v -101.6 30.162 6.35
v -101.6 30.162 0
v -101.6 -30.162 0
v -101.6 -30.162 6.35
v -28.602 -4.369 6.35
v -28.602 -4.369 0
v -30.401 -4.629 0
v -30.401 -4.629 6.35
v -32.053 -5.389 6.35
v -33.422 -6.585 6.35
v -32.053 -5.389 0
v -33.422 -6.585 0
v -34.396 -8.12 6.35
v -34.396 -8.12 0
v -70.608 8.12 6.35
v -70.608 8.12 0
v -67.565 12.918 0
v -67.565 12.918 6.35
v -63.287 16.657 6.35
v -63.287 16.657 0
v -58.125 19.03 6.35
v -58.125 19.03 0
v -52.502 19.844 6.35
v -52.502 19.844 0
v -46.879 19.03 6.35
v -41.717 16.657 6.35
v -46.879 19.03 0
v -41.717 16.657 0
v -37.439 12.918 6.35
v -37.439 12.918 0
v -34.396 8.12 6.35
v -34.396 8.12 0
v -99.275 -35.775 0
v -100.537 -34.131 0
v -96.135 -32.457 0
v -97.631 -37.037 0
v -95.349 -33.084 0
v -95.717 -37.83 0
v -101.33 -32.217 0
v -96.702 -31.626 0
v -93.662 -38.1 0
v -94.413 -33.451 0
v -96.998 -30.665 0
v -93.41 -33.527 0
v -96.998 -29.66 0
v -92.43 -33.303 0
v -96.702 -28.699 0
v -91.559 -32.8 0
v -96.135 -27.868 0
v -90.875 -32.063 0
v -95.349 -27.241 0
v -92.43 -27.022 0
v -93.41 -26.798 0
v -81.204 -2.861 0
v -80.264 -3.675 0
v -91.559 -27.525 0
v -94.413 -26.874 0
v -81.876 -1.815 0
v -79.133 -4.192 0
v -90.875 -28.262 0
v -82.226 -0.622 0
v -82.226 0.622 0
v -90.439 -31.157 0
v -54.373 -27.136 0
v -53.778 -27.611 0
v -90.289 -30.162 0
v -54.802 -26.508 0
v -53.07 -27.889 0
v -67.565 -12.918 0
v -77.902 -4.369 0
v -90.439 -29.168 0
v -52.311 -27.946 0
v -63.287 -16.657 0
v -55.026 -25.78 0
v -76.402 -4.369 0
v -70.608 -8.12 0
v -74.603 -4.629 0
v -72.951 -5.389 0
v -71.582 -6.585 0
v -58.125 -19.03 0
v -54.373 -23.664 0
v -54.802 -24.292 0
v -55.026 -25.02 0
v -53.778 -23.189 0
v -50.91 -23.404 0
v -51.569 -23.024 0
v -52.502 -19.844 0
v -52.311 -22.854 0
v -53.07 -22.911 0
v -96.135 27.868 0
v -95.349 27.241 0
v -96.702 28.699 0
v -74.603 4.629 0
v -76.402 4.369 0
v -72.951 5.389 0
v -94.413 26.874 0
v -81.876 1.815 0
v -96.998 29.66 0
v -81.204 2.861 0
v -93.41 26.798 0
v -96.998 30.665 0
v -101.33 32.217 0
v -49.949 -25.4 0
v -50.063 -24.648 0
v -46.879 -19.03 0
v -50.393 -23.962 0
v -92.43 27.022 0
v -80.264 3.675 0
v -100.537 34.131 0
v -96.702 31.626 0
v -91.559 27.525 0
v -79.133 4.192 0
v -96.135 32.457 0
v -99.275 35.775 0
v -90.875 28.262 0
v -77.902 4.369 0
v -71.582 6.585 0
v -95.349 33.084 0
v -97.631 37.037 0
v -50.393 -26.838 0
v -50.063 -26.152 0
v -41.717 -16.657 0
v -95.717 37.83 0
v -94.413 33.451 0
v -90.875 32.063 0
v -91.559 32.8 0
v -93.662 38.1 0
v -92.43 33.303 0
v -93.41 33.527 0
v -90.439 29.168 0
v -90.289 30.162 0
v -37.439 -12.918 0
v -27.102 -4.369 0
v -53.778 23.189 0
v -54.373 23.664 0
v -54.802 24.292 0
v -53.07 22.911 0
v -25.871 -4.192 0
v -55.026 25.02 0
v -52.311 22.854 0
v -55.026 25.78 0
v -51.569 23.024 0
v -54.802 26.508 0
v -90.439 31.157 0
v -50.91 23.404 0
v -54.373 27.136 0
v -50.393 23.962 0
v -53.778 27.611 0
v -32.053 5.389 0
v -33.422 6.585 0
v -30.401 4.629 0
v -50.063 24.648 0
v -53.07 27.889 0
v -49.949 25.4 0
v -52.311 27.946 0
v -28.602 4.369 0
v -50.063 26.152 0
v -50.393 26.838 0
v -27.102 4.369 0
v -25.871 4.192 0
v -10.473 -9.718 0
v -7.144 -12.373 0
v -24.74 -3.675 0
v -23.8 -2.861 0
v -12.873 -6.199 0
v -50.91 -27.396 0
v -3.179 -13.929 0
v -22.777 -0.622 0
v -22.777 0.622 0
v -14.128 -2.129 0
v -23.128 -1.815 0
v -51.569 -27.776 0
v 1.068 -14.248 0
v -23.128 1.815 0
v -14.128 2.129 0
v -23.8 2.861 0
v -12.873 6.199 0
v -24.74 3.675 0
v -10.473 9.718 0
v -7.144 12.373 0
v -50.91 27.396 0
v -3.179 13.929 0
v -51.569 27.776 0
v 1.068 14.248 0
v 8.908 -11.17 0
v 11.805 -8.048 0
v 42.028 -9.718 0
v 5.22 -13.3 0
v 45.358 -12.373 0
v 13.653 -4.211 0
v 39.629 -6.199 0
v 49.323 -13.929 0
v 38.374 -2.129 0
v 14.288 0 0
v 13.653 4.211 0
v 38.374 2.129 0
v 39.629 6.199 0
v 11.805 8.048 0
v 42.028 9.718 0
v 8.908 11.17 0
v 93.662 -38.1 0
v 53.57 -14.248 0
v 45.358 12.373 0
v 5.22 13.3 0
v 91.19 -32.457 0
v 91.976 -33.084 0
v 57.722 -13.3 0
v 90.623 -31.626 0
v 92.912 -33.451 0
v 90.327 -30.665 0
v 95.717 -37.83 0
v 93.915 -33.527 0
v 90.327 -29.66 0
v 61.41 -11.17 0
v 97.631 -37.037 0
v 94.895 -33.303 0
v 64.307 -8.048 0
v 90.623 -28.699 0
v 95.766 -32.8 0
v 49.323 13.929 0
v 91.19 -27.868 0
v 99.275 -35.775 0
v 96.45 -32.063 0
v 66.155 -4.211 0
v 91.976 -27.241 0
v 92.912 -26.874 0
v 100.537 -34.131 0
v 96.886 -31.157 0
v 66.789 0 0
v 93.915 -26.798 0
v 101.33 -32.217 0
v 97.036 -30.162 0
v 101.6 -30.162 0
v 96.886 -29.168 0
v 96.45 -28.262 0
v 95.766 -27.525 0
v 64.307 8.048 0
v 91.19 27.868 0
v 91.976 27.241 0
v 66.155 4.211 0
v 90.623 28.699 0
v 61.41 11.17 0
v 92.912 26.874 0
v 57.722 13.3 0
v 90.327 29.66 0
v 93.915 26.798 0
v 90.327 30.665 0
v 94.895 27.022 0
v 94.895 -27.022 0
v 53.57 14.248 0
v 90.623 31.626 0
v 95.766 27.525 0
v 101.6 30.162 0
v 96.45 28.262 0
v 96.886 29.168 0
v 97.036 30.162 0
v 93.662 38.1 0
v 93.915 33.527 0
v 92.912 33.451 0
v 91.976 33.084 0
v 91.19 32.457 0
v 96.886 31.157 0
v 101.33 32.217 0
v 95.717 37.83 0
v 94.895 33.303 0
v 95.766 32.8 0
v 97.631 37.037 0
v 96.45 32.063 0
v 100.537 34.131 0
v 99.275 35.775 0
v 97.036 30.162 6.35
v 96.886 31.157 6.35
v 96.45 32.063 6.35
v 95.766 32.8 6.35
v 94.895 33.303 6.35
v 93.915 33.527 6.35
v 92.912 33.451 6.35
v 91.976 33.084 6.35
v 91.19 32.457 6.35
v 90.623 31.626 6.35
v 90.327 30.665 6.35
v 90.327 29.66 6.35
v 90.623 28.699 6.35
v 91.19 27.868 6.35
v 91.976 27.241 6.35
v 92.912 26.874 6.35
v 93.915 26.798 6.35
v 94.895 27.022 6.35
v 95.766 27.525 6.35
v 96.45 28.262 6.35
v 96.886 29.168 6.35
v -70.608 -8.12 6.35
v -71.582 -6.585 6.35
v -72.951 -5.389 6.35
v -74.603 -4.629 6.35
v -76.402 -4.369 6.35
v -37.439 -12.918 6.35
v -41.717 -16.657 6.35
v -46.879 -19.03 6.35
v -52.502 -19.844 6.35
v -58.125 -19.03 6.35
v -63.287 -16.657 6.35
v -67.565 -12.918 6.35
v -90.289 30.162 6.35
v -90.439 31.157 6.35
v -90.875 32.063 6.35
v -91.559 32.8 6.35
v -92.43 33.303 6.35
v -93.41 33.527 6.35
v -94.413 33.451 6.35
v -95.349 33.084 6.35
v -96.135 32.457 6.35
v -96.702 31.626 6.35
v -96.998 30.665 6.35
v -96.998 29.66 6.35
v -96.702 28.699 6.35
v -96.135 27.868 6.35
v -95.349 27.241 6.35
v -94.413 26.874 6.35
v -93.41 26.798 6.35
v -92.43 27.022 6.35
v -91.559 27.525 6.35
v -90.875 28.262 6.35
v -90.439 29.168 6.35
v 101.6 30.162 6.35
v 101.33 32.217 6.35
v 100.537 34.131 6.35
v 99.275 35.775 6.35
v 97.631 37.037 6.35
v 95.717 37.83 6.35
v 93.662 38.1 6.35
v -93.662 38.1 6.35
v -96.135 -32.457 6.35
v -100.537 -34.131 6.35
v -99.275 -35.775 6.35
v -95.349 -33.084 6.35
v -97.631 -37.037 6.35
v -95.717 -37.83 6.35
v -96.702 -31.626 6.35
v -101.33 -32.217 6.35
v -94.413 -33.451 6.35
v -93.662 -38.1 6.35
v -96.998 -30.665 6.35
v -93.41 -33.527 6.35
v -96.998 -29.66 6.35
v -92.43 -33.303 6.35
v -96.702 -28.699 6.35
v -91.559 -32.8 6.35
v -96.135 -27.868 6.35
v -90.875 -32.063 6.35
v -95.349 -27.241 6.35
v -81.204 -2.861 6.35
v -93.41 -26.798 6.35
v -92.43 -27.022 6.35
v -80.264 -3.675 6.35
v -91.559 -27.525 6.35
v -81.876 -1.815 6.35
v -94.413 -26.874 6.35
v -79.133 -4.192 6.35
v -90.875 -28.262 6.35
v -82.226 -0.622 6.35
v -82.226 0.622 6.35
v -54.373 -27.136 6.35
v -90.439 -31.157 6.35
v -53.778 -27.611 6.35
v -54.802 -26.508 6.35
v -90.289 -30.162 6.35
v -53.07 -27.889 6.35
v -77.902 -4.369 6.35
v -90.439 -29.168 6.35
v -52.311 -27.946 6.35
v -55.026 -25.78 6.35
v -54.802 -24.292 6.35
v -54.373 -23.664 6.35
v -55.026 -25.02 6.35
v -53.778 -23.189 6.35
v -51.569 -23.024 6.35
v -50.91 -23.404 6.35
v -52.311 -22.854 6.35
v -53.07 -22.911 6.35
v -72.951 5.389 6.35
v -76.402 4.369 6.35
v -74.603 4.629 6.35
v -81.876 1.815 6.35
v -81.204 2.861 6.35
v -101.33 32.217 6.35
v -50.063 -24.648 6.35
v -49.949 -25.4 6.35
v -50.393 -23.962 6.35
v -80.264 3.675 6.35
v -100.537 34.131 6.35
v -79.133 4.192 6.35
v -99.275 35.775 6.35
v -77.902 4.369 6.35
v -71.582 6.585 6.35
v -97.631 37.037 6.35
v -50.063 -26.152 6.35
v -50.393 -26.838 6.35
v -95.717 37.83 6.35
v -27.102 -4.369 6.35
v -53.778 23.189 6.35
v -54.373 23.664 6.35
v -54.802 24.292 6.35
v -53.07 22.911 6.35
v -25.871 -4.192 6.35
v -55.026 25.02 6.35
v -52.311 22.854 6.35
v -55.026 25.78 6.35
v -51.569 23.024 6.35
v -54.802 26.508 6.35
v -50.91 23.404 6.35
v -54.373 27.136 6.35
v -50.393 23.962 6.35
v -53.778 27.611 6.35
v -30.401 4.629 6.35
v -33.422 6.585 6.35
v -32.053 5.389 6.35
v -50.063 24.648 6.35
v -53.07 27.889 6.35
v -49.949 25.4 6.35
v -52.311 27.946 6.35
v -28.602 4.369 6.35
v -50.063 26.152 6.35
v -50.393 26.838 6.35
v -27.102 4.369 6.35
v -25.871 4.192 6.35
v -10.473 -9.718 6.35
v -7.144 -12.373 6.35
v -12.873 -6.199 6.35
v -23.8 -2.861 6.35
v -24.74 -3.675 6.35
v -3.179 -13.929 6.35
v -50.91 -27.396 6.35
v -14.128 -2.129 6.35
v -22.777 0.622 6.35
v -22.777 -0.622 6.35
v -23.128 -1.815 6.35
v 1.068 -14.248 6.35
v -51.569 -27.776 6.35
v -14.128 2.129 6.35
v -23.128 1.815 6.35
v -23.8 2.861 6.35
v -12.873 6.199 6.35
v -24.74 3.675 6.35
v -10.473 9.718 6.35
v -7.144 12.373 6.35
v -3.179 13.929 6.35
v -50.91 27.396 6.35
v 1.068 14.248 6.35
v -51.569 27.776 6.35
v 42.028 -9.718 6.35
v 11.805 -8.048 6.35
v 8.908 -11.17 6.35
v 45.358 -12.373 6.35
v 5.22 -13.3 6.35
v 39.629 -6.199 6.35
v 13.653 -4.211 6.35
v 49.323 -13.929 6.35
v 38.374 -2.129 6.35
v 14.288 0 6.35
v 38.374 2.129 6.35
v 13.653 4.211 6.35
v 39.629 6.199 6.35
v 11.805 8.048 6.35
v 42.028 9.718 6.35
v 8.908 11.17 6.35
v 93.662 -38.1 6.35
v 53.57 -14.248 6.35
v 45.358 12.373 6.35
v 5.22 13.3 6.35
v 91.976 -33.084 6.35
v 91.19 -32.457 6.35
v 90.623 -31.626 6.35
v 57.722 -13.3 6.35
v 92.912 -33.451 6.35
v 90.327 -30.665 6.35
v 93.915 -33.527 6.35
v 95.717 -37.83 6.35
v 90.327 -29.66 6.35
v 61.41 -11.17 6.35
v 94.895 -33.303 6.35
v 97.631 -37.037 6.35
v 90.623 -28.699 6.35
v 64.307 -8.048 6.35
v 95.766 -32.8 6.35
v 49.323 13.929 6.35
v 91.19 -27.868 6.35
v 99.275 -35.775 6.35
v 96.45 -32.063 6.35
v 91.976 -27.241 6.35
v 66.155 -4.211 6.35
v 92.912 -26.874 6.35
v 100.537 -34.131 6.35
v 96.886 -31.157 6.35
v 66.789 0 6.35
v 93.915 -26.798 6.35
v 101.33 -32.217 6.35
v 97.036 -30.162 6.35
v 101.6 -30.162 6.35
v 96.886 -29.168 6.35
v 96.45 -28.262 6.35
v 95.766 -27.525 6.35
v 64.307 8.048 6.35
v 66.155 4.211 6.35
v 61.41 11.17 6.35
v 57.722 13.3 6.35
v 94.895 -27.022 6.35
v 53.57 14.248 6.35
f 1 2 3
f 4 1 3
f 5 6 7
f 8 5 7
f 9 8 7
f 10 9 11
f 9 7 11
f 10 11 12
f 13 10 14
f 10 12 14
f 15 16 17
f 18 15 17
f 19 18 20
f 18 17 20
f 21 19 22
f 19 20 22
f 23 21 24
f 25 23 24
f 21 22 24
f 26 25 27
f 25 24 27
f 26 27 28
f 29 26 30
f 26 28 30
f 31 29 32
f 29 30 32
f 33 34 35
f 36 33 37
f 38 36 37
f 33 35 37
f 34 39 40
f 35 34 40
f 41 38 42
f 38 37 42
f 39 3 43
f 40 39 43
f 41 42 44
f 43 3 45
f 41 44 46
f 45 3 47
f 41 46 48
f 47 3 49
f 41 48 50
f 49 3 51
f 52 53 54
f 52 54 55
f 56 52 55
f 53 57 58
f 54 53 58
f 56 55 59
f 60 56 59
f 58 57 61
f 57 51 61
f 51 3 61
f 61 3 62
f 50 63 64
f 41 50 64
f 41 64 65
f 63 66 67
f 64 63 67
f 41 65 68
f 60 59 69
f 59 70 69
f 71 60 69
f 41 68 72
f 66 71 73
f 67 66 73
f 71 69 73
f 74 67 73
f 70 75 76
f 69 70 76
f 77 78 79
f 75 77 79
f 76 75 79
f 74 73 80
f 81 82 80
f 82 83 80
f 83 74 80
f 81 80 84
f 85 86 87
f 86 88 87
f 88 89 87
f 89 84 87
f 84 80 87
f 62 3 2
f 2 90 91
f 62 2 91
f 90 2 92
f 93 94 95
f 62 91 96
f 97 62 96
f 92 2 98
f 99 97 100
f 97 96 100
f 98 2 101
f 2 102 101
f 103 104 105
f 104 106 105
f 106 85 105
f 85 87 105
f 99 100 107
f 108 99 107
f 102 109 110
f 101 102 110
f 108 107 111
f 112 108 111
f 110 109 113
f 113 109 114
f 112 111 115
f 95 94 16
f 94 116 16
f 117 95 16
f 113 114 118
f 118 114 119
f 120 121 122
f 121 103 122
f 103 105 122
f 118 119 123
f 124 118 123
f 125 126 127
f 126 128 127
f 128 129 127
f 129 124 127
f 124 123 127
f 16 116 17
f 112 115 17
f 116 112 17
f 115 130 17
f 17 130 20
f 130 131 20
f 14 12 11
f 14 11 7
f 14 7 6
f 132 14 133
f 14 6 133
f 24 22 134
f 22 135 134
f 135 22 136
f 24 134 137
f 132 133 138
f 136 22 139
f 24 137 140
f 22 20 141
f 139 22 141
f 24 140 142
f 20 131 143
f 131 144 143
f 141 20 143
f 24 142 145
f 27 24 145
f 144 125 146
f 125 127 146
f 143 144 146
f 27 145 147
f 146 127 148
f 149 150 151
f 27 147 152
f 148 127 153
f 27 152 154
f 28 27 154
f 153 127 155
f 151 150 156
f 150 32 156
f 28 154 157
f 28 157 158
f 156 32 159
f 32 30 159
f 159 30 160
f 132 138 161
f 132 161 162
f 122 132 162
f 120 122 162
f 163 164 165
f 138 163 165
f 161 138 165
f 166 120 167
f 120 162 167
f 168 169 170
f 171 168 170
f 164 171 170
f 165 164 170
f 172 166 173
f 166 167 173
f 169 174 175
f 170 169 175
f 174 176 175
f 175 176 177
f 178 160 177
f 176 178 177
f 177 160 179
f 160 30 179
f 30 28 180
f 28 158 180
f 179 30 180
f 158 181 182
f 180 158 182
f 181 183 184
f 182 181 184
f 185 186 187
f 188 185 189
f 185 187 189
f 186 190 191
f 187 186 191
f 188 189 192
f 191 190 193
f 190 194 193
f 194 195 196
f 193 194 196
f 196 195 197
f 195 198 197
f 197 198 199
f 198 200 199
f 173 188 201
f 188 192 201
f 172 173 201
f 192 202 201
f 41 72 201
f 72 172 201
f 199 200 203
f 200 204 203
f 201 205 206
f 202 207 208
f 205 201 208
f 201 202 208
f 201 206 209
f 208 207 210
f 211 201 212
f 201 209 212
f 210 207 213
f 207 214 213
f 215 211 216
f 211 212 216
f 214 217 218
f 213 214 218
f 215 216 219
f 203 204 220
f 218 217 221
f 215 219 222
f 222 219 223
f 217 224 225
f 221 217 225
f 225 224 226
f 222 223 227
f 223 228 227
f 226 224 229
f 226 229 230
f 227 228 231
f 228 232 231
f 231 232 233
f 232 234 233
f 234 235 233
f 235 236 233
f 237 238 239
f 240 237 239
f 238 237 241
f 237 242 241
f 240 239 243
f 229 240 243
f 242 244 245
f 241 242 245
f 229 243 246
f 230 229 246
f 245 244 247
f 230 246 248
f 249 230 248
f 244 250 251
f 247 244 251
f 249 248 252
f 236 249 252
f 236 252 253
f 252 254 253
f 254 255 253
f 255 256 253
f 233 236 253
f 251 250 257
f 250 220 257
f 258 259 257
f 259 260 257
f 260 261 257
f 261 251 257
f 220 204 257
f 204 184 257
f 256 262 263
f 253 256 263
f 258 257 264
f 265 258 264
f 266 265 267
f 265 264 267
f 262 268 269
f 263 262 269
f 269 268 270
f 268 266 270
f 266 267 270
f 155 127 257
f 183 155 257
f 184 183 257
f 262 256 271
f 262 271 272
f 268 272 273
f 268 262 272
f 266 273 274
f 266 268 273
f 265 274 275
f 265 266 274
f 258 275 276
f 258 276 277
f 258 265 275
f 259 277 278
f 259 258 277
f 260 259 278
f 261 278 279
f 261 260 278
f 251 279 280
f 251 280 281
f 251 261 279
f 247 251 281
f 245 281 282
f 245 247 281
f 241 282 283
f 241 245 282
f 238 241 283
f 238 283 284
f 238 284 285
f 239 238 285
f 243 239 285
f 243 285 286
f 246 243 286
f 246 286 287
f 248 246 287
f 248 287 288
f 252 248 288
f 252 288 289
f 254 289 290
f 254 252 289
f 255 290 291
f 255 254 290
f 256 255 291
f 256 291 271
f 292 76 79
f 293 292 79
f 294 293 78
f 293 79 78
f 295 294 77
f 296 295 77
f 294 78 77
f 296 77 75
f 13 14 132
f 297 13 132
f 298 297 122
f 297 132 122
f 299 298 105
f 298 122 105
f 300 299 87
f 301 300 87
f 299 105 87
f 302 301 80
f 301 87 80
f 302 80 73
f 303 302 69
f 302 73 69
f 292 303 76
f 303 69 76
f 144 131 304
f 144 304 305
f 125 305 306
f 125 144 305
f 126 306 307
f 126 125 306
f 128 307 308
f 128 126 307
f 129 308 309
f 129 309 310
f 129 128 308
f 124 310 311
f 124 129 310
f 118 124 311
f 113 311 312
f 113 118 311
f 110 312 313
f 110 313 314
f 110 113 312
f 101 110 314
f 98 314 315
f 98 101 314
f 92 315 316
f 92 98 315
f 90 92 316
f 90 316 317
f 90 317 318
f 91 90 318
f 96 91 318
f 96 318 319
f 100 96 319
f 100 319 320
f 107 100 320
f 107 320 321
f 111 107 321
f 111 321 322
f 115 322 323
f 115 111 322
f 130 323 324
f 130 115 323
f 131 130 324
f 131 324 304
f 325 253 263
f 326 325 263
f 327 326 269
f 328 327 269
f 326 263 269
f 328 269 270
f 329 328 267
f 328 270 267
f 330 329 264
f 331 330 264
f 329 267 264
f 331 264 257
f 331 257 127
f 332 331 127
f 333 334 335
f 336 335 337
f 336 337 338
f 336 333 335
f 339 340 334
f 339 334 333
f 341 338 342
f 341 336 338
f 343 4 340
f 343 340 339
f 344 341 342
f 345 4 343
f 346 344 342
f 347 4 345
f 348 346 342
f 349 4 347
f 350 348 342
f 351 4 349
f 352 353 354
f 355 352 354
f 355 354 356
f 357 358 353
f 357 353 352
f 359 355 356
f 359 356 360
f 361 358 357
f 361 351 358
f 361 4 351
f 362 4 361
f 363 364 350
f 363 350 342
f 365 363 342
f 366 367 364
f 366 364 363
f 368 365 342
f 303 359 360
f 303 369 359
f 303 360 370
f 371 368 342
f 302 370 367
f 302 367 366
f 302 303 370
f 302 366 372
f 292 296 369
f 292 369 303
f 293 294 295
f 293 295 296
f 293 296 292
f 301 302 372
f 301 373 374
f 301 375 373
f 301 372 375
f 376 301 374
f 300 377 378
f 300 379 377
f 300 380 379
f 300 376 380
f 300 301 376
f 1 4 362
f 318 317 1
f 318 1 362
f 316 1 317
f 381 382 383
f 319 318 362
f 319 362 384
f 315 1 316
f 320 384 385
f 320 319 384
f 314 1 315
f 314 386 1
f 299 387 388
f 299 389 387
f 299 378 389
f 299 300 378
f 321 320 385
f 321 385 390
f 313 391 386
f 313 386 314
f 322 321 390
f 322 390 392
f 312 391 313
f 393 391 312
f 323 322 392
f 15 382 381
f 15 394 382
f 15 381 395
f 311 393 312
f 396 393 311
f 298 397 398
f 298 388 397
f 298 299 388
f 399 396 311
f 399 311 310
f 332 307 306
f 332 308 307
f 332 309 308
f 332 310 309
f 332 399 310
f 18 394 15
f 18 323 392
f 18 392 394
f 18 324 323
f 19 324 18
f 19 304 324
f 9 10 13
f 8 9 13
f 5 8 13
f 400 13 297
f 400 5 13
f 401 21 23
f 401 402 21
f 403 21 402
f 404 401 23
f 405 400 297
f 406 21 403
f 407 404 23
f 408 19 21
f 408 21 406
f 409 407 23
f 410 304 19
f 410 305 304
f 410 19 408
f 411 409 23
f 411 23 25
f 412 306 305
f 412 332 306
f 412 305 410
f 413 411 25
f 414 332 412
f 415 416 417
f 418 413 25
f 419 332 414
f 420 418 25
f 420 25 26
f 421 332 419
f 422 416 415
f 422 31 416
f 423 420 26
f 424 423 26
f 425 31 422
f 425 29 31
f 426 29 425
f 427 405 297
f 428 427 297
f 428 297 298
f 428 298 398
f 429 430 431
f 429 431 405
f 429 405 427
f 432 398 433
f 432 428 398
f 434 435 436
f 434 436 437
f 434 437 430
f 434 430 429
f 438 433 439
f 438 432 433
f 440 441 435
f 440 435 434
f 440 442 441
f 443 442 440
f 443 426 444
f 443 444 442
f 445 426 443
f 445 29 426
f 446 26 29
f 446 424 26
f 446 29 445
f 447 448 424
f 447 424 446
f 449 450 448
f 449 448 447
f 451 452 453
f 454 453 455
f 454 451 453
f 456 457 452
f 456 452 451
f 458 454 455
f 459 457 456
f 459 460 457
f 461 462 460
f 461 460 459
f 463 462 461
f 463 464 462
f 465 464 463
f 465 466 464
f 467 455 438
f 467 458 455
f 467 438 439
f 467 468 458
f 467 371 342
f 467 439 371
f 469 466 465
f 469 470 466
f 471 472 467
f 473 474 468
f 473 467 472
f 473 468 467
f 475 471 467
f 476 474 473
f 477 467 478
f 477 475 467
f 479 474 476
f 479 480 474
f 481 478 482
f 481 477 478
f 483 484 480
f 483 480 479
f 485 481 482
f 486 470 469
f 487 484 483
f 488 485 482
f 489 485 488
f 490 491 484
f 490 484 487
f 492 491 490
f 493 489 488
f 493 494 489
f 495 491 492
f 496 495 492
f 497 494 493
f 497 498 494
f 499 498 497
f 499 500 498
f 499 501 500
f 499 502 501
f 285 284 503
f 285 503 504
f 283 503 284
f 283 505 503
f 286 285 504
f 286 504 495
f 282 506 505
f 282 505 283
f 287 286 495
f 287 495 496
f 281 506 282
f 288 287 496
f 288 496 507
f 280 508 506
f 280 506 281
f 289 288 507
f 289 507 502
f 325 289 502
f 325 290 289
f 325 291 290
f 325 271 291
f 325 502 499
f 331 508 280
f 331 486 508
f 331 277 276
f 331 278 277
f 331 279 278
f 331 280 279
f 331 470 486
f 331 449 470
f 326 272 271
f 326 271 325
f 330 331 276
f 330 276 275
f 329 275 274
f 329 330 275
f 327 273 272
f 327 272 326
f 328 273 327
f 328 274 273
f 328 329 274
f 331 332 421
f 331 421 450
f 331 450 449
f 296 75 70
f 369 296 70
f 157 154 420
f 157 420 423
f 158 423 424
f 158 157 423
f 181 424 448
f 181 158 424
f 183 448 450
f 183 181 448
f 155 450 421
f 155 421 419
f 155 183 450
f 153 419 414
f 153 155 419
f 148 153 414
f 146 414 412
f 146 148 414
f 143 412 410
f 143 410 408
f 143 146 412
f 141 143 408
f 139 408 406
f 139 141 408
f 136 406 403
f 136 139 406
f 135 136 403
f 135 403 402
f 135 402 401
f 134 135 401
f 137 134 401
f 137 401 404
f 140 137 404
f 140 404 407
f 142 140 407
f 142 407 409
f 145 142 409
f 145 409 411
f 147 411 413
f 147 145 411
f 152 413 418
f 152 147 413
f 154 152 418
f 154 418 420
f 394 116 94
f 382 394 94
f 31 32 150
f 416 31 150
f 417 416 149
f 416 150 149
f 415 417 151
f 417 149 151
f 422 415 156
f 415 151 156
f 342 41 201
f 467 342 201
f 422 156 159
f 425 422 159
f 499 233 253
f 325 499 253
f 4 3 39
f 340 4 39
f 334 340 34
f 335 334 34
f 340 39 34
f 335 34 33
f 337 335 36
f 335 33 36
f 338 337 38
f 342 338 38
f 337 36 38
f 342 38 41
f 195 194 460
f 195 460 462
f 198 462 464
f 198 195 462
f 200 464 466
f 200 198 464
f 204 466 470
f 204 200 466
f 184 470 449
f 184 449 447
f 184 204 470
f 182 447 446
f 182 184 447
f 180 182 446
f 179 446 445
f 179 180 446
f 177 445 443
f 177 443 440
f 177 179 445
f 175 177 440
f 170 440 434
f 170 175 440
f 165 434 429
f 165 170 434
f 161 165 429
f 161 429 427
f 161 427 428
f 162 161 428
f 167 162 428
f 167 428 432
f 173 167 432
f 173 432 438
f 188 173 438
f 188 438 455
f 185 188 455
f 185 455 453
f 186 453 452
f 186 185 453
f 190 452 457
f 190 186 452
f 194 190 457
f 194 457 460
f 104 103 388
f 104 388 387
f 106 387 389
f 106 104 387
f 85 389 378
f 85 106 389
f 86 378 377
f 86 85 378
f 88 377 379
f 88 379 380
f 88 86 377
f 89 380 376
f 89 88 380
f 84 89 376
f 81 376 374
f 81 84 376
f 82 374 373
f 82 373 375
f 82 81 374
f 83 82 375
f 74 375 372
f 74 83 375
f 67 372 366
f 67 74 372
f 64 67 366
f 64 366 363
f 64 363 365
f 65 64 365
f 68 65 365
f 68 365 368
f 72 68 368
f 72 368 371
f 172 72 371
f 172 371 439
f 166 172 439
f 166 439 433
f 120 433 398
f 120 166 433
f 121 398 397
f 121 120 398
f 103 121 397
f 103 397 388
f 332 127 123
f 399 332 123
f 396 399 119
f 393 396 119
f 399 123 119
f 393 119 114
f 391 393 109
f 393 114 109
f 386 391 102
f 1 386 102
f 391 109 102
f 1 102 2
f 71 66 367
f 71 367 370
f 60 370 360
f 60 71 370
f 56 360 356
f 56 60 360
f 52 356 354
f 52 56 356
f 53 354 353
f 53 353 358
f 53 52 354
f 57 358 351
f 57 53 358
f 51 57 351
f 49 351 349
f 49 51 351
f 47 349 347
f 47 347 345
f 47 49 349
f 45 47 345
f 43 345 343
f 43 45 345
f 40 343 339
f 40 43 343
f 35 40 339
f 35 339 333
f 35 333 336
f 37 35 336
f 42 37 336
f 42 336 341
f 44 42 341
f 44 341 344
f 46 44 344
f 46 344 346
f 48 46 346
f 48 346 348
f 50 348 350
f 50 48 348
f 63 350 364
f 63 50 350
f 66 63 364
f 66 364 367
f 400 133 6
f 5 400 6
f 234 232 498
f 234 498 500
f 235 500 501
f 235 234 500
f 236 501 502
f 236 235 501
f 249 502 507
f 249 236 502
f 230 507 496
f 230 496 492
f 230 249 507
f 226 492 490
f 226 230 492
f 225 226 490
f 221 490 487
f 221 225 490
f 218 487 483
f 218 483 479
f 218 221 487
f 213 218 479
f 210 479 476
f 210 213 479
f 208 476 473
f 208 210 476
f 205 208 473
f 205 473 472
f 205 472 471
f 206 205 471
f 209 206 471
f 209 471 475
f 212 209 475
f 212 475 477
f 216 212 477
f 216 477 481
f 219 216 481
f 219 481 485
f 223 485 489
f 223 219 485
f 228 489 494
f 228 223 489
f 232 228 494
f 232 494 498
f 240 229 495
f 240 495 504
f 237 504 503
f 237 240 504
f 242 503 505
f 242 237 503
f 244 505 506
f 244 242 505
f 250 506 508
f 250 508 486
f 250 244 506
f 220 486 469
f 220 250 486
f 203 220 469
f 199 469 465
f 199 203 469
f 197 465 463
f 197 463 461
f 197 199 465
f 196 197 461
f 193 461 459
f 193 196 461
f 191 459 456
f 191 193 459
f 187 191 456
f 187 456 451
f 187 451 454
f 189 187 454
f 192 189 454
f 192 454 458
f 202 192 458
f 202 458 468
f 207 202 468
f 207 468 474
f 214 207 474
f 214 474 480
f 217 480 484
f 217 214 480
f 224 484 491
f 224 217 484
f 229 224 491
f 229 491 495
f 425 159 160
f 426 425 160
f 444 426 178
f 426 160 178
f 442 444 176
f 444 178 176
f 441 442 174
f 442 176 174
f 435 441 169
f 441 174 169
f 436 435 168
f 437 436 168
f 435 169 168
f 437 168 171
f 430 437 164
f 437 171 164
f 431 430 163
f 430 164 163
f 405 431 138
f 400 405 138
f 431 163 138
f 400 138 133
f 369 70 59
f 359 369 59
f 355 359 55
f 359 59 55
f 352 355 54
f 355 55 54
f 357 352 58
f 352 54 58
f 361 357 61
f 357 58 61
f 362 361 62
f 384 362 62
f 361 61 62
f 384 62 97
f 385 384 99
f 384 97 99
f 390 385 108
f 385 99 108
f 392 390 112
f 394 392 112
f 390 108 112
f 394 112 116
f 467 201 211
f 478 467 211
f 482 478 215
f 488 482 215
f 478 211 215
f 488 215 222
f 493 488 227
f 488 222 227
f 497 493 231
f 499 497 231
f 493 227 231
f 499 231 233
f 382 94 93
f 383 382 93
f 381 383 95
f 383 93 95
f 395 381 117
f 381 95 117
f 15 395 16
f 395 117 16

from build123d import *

# Parameters (mm, degrees)
SKETCH1_R           = 14.2875
SKETCH1_R_2         = 3.3734375
SKETCH1_R_3         = 2.5527
BOSS_EXTRUDE1_DEPTH = 6.35


with BuildPart() as part:
    # Sketch1 → Boss-Extrude1 (new body)
    with BuildSketch(Plane.XY):
        with BuildLine():
            Line((-93.6625, -38.1), (93.6625, -38.1))
            ThreePointArc((93.6625, -38.1), (99.275160076, -35.775160076), (101.6, -30.1625))
            Line((101.6, -30.1625), (101.6, 30.1625))
            ThreePointArc((101.6, 30.1625), (99.275160076, 35.775160076), (93.6625, 38.1))
            Line((93.6625, 38.1), (-93.6625, 38.1))
            ThreePointArc((-93.6625, 38.1), (-99.275160076, 35.775160076), (-101.6, 30.1625))
            Line((-101.6, 30.1625), (-101.6, -30.1625))
            ThreePointArc((-101.6, -30.1625), (-99.275160076, -35.775160076), (-93.6625, -38.1))
        make_face()
        Circle(SKETCH1_R, mode=Mode.SUBTRACT)
        with Locations((52.5018, 0)):
            Circle(SKETCH1_R, mode=Mode.SUBTRACT)
        with Locations((-93.6625, 30.1625)):
            Circle(SKETCH1_R_2, mode=Mode.SUBTRACT)
        with Locations((93.6625, 30.1625)):
            Circle(SKETCH1_R_2, mode=Mode.SUBTRACT)
        with Locations((93.6625, -30.1625)):
            Circle(SKETCH1_R_2, mode=Mode.SUBTRACT)
        with Locations((-93.6625, -30.1625)):
            Circle(SKETCH1_R_2, mode=Mode.SUBTRACT)
        with Locations((-52.5018, 25.4)):
            Circle(SKETCH1_R_3, mode=Mode.SUBTRACT)
        with Locations((-52.5018, -25.4)):
            Circle(SKETCH1_R_3, mode=Mode.SUBTRACT)
        with BuildLine():
            Line((-28.601593607, 4.3688), (-27.1018, 4.3688))
            ThreePointArc((-27.1018, 4.3688), (-22.733, 0), (-27.1018, -4.3688))
            Line((-27.1018, -4.3688), (-28.601593607, -4.3688))
            ThreePointArc((-28.601593607, -4.3688), (-32.052828476, -5.388558178), (-34.395583036, -8.12030303))
            ThreePointArc((-34.395583036, -8.12030303), (-52.5018, -19.84375), (-70.608016964, -8.12030303))
            ThreePointArc((-70.608016964, -8.12030303), (-72.950771524, -5.388558178), (-76.402006393, -4.3688))
            Line((-76.402006393, -4.3688), (-77.9018, -4.3688))
            ThreePointArc((-77.9018, -4.3688), (-82.2706, 0), (-77.9018, 4.3688))
            Line((-77.9018, 4.3688), (-76.402006393, 4.3688))
            ThreePointArc((-76.402006393, 4.3688), (-72.950771524, 5.388558178), (-70.608016964, 8.12030303))
            ThreePointArc((-70.608016964, 8.12030303), (-52.5018, 19.84375), (-34.395583036, 8.12030303))
            ThreePointArc((-34.395583036, 8.12030303), (-32.052828476, 5.388558178), (-28.601593607, 4.3688))
        make_face(mode=Mode.SUBTRACT)
    extrude(amount=BOSS_EXTRUDE1_DEPTH)


solid = part.part
